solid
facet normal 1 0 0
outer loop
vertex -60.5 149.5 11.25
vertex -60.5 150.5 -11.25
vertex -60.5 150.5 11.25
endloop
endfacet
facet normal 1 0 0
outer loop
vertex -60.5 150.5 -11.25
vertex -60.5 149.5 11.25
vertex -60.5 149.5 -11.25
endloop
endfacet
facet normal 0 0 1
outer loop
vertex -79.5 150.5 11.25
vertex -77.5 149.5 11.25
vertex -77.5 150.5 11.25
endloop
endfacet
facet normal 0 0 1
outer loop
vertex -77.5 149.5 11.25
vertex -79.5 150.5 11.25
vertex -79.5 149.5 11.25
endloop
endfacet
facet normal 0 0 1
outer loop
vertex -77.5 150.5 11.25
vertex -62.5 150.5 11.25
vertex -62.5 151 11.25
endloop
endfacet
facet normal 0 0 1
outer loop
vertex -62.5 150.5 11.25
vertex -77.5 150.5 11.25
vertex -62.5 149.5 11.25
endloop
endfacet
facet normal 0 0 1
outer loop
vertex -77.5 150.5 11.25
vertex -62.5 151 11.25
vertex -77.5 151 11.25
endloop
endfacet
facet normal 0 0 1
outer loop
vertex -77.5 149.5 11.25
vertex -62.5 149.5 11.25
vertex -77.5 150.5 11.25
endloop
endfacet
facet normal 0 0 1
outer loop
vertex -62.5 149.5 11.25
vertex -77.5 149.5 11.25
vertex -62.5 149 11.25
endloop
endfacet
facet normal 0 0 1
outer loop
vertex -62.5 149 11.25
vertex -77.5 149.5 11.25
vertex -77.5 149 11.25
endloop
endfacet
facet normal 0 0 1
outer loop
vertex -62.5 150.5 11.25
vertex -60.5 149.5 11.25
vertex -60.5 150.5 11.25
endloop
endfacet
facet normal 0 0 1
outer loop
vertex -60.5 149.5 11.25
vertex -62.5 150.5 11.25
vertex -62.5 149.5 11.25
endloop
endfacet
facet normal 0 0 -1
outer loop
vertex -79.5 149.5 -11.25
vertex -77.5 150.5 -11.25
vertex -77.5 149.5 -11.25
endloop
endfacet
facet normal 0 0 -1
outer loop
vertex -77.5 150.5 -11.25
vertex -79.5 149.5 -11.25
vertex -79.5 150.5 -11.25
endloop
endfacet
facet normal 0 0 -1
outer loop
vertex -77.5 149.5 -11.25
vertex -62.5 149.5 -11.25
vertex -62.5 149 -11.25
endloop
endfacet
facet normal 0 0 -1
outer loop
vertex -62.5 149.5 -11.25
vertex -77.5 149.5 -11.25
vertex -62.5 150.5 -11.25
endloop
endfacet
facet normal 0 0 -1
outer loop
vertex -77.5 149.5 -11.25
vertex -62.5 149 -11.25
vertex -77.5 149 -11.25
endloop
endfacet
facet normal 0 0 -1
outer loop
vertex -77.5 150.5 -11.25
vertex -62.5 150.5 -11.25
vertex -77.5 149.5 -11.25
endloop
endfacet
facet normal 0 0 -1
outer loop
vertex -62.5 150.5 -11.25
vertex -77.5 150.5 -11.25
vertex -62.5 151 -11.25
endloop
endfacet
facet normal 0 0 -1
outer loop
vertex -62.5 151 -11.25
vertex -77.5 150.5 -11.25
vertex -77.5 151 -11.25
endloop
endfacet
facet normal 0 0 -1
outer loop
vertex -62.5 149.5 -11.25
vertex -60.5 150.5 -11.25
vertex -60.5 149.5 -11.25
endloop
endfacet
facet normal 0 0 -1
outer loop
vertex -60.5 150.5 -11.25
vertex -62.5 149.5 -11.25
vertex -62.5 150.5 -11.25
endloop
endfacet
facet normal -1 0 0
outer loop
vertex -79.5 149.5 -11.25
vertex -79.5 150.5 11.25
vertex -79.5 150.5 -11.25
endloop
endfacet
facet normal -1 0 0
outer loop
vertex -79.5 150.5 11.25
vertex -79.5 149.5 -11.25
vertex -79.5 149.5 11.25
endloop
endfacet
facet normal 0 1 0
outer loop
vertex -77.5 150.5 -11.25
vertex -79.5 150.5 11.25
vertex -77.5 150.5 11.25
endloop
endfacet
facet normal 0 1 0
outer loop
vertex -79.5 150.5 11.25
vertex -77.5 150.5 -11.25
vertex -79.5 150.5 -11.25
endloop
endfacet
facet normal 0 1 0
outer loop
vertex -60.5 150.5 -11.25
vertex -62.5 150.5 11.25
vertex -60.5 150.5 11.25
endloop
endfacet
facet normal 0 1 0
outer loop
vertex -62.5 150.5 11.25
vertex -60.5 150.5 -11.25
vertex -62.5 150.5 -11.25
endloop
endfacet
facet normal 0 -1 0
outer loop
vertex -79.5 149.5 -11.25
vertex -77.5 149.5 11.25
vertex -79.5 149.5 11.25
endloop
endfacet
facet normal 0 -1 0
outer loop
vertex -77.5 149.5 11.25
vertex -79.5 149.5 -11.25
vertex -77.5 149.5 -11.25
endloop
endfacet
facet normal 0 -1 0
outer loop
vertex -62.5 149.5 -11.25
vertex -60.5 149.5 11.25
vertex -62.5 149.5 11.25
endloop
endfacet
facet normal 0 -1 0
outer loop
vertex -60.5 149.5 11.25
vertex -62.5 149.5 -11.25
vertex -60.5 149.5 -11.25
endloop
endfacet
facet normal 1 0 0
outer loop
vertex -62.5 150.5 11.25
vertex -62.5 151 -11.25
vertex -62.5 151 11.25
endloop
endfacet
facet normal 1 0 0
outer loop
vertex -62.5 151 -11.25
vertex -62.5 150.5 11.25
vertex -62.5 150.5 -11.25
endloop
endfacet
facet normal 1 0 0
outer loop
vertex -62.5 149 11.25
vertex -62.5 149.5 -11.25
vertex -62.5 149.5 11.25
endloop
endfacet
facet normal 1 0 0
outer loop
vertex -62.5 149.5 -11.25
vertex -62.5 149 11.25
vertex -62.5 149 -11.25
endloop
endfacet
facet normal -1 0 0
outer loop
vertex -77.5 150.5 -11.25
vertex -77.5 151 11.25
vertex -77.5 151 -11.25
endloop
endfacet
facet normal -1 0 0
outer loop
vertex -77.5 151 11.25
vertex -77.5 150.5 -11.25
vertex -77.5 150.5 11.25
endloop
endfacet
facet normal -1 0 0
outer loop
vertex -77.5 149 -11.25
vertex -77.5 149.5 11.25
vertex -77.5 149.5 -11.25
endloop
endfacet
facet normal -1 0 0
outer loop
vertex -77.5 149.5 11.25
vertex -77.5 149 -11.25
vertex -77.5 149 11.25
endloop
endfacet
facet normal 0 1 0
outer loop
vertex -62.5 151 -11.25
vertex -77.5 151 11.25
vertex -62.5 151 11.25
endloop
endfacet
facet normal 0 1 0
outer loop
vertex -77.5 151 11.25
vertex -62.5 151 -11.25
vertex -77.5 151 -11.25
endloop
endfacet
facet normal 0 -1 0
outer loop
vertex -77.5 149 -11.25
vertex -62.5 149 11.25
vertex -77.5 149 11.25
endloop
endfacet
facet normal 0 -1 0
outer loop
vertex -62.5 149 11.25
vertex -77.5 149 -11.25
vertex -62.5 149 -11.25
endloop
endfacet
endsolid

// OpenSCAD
// modular, change:
box_x_compartments = 2;
box_y_compartments = 2;
box_height = 25;

// what generate:
//box();
//translate([70, 0, 0]) lid();
translate([-70, 150, 0]) divider(1);

// internal parameters:
out_wall_size = 2.5;
divider_wall_size = 2;
divider_size_tolerance = 1;
compartment_size = 20;

lid_angle = 65;
lid_tolerance = 0.75;

// internal computes
total_width = box_x_compartments * compartment_size + 2* out_wall_size;
total_height = box_y_compartments * compartment_size + 2*out_wall_size;
total_tall = box_height + 2*out_wall_size;
    
inner_width = total_width - 2*out_wall_size;
inner_height = total_height - 2*out_wall_size;

module divider(compartment_count) {
    divider_width = compartment_count * compartment_size - divider_size_tolerance;
    divider_height = box_height-out_wall_size;
    cube(size=[divider_width, divider_wall_size/2, divider_height], center=true);
    cube(size=[divider_width - 2*divider_wall_size, divider_wall_size, divider_height], center=true);
    
    if (compartment_count > 1) {
        for (i = [1:compartment_count-1]) {
            translate([divider_width/-2 - divider_size_tolerance/2 + i*compartment_size, divider_wall_size/-2, 0]) rotate(a=[0, 0, 0]) divider_holder(divider_wall_size, divider_height);
        translate([divider_width/-2 - divider_size_tolerance/2 + i*compartment_size, divider_wall_size/2, 0]) rotate(a=[0, 0, 180]) divider_holder(divider_wall_size, divider_height);
        }
    }
}

module lid() {
    rotate(a=[90, 0, 0]) lid_shape(inner_width+out_wall_size-lid_tolerance, inner_height+out_wall_size, 2*out_wall_size, lid_angle);
}

module box() {
    difference () {
        union() {
            translate([0, 0, out_wall_size]) difference() {
                cube(size=[total_width, total_height, total_tall], center=true);
                translate([0, 0, out_wall_size]) cube(size=[inner_width, inner_height, total_tall], center=true);                               
            }
           // vršek pro vyříznutí na víko
           translate([0, 0, box_height/2+out_wall_size]) cube(size=[total_width, total_height, 2*out_wall_size], center=true);  
        }   
    
        // víko
        translate([inner_width/-2-out_wall_size/2, inner_height/2, box_height/2-0.01]) rotate(a=[90, 0, 0]) lid_shape(inner_width+out_wall_size, inner_height+out_wall_size+1, 4*out_wall_size, lid_angle);
    }
    
    
   
    
    for (i=[1:box_x_compartments-1]) {
        translate([total_width/-2+out_wall_size+i*compartment_size, total_height/-2, 0]) rotate(a=[0, 0, 0]) divider_holder(out_wall_size);
        translate([total_width/-2+out_wall_size+i*compartment_size, total_height/2, 0]) rotate(a=[0, 0, 180]) divider_holder(out_wall_size);
    }
    
    for (i=[1:box_y_compartments-1]) {
        translate([total_width/2, total_height/-2+out_wall_size+i*compartment_size, 0]) rotate(a=[0, 0, 90]) divider_holder(out_wall_size);
        translate([total_width/-2, total_height/-2+out_wall_size+i*compartment_size, 0]) rotate(a=[0, 0, -90]) divider_holder(out_wall_size);
    }
    
}



module lid_shape(width, height, tall, angle) {
    linear_extrude(height=height) polygon([[0, 0], [tall/tan(angle), tall], [width-(tall/tan(angle)), tall], [width, 0]]);
}

module divider_holder(base_size, height=box_height) {
    translate([0, (base_size+divider_wall_size)/2, 0]) difference() {
        cube(size=[3*divider_wall_size, base_size+divider_wall_size, height], center=true);
        translate([0, (base_size-1)/-2+base_size, -1]) cube(size=[divider_wall_size, divider_wall_size+1, height+3], center=true);
    }


    
}
